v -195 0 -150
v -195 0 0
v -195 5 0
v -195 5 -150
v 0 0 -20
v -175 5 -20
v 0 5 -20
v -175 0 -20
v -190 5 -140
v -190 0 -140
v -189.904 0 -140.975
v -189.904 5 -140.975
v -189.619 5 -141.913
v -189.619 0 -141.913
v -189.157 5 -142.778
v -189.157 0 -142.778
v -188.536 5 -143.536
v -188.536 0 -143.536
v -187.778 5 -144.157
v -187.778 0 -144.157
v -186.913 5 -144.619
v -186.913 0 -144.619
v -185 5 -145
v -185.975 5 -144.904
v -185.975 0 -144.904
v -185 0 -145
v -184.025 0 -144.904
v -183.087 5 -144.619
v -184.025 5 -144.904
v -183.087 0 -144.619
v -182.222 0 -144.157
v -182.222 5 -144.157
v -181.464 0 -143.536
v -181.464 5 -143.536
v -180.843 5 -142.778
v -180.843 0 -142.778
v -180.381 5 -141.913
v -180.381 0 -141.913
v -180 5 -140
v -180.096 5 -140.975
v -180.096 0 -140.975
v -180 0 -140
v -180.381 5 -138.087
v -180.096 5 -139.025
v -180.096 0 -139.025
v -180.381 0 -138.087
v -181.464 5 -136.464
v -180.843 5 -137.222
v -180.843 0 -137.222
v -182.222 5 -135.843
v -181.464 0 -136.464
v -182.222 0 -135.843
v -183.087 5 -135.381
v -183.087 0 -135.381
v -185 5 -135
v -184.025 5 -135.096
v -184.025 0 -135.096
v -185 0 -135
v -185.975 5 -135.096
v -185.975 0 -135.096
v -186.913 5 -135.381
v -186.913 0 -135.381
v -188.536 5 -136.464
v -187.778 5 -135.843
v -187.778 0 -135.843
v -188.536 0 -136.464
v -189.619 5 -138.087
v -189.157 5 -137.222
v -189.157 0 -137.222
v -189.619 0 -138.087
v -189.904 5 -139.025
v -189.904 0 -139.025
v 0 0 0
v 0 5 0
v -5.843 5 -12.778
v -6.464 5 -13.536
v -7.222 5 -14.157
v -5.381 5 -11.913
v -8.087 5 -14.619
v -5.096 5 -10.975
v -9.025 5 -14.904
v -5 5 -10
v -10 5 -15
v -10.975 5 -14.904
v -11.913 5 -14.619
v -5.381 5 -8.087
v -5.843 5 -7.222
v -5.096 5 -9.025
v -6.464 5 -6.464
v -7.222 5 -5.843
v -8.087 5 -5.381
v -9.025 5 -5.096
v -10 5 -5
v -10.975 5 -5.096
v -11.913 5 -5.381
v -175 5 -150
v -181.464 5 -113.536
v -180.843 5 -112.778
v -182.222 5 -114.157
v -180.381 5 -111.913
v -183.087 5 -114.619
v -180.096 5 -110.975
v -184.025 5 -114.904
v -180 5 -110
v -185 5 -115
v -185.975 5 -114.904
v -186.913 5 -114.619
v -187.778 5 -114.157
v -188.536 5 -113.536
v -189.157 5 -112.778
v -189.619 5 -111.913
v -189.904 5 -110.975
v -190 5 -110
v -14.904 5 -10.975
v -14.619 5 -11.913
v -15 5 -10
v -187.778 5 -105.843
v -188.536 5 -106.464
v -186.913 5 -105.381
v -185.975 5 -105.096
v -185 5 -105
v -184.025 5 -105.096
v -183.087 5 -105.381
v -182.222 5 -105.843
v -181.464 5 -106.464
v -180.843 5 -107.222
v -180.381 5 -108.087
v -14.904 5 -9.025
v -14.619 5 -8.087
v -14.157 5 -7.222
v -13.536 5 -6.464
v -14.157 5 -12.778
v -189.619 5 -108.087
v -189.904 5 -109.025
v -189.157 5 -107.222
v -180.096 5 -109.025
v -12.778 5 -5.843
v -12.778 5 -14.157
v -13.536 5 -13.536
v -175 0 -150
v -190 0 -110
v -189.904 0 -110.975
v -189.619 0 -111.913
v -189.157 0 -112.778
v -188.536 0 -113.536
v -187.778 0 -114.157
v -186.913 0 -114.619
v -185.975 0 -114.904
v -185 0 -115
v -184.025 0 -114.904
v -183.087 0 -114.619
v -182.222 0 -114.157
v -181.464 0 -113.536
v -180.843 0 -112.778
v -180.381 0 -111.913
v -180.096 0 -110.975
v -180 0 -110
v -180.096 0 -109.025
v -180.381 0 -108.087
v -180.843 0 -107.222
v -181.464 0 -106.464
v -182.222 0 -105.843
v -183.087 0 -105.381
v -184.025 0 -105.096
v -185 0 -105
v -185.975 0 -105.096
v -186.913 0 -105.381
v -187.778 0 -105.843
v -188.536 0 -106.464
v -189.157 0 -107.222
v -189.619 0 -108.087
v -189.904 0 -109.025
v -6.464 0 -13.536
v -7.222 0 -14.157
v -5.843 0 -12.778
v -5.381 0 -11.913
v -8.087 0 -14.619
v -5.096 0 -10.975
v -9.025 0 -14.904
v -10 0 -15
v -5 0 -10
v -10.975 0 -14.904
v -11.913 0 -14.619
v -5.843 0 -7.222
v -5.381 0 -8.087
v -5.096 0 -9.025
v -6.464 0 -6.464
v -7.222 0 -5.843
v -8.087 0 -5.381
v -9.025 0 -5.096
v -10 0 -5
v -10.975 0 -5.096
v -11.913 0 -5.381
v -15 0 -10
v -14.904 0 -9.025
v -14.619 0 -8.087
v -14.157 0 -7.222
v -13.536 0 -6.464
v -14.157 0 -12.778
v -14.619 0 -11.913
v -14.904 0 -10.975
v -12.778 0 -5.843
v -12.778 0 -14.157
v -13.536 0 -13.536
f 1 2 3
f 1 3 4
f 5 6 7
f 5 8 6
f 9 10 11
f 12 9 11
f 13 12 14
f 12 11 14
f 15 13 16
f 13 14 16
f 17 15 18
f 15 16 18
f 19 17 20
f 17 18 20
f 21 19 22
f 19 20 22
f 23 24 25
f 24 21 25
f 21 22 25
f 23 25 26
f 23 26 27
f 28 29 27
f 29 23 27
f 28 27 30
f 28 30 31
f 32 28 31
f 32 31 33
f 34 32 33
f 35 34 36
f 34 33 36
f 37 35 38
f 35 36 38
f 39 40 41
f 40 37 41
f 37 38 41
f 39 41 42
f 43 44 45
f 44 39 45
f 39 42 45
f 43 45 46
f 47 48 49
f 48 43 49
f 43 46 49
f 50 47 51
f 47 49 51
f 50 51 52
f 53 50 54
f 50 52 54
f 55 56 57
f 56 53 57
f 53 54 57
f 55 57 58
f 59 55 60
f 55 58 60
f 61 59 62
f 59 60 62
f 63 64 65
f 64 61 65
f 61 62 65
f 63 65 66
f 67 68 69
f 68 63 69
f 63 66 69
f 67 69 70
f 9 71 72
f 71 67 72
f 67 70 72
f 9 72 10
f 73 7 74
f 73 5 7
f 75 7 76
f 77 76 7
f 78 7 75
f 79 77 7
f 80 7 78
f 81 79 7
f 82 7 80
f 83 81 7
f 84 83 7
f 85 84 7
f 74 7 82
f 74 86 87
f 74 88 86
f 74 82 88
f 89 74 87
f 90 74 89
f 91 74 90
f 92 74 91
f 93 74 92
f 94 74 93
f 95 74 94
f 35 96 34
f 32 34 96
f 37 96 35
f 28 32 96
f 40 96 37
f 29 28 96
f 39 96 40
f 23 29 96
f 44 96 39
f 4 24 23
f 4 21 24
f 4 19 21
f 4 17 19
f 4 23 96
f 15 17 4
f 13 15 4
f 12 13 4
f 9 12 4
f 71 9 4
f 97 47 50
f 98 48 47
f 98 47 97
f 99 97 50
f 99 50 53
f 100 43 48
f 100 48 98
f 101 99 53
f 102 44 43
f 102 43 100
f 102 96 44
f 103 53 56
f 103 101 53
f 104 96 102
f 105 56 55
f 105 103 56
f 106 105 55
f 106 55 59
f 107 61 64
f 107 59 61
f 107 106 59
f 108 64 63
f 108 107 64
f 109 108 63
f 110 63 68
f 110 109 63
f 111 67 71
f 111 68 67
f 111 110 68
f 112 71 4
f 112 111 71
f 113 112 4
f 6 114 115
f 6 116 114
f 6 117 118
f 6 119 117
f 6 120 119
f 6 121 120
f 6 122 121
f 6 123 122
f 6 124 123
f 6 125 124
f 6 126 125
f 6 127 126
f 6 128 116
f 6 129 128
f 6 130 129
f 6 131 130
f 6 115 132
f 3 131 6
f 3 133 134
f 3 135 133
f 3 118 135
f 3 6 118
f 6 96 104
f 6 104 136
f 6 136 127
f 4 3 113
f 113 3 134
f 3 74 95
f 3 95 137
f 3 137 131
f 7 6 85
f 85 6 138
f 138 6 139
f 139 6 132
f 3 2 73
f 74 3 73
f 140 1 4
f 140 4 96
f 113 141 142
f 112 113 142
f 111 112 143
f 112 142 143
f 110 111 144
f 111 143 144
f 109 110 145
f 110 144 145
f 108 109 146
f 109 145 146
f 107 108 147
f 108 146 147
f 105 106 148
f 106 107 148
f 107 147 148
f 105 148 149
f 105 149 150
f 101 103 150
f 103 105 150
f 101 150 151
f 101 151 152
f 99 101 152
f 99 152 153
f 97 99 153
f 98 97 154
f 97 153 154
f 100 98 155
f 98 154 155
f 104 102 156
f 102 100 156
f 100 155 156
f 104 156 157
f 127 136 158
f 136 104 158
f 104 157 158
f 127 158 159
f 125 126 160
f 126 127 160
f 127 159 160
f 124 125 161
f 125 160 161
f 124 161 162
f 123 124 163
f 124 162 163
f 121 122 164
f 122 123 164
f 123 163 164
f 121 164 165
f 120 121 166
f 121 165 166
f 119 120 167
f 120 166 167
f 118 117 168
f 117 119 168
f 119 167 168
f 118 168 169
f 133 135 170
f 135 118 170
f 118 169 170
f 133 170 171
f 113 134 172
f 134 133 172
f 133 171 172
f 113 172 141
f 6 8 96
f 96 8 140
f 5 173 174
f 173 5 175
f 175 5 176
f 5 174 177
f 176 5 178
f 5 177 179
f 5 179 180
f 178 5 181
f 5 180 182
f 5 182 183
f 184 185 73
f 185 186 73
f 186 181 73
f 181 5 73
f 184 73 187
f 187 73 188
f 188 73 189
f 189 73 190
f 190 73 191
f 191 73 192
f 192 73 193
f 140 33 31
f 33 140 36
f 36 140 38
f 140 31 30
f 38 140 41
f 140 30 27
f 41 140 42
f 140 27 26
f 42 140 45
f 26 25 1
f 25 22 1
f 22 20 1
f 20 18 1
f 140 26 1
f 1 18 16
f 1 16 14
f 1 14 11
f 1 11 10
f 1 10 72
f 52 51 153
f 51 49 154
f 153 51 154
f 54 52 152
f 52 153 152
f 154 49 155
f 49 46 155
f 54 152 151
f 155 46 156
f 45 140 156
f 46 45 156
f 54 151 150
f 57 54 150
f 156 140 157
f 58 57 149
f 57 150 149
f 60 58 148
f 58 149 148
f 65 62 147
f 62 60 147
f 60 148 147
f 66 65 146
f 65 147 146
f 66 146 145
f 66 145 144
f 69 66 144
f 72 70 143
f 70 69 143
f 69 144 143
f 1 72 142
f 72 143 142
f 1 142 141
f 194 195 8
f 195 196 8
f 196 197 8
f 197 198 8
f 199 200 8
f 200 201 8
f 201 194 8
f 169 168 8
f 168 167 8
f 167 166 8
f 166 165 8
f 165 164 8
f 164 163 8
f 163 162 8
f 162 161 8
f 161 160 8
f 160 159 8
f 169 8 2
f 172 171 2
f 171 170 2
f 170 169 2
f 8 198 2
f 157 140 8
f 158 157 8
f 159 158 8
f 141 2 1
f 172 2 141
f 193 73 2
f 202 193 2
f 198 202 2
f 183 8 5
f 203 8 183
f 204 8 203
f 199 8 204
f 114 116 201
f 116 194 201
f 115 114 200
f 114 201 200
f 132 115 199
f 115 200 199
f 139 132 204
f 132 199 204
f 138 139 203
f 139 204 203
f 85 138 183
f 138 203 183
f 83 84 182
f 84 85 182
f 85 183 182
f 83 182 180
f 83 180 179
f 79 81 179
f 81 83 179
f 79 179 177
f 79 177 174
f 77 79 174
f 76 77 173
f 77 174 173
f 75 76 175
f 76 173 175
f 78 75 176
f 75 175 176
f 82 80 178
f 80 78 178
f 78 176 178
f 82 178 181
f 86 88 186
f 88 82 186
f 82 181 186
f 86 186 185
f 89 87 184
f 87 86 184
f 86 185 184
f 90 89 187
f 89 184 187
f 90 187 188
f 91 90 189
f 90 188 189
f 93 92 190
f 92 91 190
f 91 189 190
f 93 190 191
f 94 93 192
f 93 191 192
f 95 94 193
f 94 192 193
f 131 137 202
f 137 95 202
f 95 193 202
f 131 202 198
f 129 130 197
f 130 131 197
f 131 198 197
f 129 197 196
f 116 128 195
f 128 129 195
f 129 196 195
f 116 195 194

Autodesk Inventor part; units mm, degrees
ref_plane "YZ Plane" through (0, 0, 0) normal (1, 0, 0) x (0, 1, 0)
ref_plane "XZ Plane" through (0, 0, 0) normal (0, 1, 0) x (-1, 0, 0)
ref_plane "XY Plane" through (0, 0, 0) normal (0, 0, 1) x (1, 0, 0)
sketch "スケッチ1" plane through (0, 0, 0) normal (0, 1, 0) x (-1, 0, 0)
  line L0 (234, 0) -> (-39, 0) projected
  line L1 (0, -180) -> (0, 30) projected
  line L2 (0, 0) -> (195, 0)
  line L3 (195, 0) -> (195, -150)
  line L4 (175, -20) -> (0, -20)
  circle A0 centre (10, -10) radius 5
  circle A1 centre (185, -110) radius 5
  line L5 (195, -150) -> (175, -150)
  circle A2 centre (185, -140) radius 5
  line L6 (175, -20) -> (175, -150)
  dimension "d0" = 195
  dimension "d2" = 20
  dimension "d3" = 150
  dimension "d5" = 10
  dimension "d6" = 10
  dimension "d7" = 10
  dimension "d8" = 10
  dimension "d9" = 10
  dimension "d23" = 40
  dimension "d24" = 10
  dimension "d30" = 10
  dimension "d31" = 10
  dimension "d34" = 20
extrude "押し出し4" add sketch "スケッチ1" along normal blind 5
properties part number "rocker_alt" material "アルミニウム 6061"
